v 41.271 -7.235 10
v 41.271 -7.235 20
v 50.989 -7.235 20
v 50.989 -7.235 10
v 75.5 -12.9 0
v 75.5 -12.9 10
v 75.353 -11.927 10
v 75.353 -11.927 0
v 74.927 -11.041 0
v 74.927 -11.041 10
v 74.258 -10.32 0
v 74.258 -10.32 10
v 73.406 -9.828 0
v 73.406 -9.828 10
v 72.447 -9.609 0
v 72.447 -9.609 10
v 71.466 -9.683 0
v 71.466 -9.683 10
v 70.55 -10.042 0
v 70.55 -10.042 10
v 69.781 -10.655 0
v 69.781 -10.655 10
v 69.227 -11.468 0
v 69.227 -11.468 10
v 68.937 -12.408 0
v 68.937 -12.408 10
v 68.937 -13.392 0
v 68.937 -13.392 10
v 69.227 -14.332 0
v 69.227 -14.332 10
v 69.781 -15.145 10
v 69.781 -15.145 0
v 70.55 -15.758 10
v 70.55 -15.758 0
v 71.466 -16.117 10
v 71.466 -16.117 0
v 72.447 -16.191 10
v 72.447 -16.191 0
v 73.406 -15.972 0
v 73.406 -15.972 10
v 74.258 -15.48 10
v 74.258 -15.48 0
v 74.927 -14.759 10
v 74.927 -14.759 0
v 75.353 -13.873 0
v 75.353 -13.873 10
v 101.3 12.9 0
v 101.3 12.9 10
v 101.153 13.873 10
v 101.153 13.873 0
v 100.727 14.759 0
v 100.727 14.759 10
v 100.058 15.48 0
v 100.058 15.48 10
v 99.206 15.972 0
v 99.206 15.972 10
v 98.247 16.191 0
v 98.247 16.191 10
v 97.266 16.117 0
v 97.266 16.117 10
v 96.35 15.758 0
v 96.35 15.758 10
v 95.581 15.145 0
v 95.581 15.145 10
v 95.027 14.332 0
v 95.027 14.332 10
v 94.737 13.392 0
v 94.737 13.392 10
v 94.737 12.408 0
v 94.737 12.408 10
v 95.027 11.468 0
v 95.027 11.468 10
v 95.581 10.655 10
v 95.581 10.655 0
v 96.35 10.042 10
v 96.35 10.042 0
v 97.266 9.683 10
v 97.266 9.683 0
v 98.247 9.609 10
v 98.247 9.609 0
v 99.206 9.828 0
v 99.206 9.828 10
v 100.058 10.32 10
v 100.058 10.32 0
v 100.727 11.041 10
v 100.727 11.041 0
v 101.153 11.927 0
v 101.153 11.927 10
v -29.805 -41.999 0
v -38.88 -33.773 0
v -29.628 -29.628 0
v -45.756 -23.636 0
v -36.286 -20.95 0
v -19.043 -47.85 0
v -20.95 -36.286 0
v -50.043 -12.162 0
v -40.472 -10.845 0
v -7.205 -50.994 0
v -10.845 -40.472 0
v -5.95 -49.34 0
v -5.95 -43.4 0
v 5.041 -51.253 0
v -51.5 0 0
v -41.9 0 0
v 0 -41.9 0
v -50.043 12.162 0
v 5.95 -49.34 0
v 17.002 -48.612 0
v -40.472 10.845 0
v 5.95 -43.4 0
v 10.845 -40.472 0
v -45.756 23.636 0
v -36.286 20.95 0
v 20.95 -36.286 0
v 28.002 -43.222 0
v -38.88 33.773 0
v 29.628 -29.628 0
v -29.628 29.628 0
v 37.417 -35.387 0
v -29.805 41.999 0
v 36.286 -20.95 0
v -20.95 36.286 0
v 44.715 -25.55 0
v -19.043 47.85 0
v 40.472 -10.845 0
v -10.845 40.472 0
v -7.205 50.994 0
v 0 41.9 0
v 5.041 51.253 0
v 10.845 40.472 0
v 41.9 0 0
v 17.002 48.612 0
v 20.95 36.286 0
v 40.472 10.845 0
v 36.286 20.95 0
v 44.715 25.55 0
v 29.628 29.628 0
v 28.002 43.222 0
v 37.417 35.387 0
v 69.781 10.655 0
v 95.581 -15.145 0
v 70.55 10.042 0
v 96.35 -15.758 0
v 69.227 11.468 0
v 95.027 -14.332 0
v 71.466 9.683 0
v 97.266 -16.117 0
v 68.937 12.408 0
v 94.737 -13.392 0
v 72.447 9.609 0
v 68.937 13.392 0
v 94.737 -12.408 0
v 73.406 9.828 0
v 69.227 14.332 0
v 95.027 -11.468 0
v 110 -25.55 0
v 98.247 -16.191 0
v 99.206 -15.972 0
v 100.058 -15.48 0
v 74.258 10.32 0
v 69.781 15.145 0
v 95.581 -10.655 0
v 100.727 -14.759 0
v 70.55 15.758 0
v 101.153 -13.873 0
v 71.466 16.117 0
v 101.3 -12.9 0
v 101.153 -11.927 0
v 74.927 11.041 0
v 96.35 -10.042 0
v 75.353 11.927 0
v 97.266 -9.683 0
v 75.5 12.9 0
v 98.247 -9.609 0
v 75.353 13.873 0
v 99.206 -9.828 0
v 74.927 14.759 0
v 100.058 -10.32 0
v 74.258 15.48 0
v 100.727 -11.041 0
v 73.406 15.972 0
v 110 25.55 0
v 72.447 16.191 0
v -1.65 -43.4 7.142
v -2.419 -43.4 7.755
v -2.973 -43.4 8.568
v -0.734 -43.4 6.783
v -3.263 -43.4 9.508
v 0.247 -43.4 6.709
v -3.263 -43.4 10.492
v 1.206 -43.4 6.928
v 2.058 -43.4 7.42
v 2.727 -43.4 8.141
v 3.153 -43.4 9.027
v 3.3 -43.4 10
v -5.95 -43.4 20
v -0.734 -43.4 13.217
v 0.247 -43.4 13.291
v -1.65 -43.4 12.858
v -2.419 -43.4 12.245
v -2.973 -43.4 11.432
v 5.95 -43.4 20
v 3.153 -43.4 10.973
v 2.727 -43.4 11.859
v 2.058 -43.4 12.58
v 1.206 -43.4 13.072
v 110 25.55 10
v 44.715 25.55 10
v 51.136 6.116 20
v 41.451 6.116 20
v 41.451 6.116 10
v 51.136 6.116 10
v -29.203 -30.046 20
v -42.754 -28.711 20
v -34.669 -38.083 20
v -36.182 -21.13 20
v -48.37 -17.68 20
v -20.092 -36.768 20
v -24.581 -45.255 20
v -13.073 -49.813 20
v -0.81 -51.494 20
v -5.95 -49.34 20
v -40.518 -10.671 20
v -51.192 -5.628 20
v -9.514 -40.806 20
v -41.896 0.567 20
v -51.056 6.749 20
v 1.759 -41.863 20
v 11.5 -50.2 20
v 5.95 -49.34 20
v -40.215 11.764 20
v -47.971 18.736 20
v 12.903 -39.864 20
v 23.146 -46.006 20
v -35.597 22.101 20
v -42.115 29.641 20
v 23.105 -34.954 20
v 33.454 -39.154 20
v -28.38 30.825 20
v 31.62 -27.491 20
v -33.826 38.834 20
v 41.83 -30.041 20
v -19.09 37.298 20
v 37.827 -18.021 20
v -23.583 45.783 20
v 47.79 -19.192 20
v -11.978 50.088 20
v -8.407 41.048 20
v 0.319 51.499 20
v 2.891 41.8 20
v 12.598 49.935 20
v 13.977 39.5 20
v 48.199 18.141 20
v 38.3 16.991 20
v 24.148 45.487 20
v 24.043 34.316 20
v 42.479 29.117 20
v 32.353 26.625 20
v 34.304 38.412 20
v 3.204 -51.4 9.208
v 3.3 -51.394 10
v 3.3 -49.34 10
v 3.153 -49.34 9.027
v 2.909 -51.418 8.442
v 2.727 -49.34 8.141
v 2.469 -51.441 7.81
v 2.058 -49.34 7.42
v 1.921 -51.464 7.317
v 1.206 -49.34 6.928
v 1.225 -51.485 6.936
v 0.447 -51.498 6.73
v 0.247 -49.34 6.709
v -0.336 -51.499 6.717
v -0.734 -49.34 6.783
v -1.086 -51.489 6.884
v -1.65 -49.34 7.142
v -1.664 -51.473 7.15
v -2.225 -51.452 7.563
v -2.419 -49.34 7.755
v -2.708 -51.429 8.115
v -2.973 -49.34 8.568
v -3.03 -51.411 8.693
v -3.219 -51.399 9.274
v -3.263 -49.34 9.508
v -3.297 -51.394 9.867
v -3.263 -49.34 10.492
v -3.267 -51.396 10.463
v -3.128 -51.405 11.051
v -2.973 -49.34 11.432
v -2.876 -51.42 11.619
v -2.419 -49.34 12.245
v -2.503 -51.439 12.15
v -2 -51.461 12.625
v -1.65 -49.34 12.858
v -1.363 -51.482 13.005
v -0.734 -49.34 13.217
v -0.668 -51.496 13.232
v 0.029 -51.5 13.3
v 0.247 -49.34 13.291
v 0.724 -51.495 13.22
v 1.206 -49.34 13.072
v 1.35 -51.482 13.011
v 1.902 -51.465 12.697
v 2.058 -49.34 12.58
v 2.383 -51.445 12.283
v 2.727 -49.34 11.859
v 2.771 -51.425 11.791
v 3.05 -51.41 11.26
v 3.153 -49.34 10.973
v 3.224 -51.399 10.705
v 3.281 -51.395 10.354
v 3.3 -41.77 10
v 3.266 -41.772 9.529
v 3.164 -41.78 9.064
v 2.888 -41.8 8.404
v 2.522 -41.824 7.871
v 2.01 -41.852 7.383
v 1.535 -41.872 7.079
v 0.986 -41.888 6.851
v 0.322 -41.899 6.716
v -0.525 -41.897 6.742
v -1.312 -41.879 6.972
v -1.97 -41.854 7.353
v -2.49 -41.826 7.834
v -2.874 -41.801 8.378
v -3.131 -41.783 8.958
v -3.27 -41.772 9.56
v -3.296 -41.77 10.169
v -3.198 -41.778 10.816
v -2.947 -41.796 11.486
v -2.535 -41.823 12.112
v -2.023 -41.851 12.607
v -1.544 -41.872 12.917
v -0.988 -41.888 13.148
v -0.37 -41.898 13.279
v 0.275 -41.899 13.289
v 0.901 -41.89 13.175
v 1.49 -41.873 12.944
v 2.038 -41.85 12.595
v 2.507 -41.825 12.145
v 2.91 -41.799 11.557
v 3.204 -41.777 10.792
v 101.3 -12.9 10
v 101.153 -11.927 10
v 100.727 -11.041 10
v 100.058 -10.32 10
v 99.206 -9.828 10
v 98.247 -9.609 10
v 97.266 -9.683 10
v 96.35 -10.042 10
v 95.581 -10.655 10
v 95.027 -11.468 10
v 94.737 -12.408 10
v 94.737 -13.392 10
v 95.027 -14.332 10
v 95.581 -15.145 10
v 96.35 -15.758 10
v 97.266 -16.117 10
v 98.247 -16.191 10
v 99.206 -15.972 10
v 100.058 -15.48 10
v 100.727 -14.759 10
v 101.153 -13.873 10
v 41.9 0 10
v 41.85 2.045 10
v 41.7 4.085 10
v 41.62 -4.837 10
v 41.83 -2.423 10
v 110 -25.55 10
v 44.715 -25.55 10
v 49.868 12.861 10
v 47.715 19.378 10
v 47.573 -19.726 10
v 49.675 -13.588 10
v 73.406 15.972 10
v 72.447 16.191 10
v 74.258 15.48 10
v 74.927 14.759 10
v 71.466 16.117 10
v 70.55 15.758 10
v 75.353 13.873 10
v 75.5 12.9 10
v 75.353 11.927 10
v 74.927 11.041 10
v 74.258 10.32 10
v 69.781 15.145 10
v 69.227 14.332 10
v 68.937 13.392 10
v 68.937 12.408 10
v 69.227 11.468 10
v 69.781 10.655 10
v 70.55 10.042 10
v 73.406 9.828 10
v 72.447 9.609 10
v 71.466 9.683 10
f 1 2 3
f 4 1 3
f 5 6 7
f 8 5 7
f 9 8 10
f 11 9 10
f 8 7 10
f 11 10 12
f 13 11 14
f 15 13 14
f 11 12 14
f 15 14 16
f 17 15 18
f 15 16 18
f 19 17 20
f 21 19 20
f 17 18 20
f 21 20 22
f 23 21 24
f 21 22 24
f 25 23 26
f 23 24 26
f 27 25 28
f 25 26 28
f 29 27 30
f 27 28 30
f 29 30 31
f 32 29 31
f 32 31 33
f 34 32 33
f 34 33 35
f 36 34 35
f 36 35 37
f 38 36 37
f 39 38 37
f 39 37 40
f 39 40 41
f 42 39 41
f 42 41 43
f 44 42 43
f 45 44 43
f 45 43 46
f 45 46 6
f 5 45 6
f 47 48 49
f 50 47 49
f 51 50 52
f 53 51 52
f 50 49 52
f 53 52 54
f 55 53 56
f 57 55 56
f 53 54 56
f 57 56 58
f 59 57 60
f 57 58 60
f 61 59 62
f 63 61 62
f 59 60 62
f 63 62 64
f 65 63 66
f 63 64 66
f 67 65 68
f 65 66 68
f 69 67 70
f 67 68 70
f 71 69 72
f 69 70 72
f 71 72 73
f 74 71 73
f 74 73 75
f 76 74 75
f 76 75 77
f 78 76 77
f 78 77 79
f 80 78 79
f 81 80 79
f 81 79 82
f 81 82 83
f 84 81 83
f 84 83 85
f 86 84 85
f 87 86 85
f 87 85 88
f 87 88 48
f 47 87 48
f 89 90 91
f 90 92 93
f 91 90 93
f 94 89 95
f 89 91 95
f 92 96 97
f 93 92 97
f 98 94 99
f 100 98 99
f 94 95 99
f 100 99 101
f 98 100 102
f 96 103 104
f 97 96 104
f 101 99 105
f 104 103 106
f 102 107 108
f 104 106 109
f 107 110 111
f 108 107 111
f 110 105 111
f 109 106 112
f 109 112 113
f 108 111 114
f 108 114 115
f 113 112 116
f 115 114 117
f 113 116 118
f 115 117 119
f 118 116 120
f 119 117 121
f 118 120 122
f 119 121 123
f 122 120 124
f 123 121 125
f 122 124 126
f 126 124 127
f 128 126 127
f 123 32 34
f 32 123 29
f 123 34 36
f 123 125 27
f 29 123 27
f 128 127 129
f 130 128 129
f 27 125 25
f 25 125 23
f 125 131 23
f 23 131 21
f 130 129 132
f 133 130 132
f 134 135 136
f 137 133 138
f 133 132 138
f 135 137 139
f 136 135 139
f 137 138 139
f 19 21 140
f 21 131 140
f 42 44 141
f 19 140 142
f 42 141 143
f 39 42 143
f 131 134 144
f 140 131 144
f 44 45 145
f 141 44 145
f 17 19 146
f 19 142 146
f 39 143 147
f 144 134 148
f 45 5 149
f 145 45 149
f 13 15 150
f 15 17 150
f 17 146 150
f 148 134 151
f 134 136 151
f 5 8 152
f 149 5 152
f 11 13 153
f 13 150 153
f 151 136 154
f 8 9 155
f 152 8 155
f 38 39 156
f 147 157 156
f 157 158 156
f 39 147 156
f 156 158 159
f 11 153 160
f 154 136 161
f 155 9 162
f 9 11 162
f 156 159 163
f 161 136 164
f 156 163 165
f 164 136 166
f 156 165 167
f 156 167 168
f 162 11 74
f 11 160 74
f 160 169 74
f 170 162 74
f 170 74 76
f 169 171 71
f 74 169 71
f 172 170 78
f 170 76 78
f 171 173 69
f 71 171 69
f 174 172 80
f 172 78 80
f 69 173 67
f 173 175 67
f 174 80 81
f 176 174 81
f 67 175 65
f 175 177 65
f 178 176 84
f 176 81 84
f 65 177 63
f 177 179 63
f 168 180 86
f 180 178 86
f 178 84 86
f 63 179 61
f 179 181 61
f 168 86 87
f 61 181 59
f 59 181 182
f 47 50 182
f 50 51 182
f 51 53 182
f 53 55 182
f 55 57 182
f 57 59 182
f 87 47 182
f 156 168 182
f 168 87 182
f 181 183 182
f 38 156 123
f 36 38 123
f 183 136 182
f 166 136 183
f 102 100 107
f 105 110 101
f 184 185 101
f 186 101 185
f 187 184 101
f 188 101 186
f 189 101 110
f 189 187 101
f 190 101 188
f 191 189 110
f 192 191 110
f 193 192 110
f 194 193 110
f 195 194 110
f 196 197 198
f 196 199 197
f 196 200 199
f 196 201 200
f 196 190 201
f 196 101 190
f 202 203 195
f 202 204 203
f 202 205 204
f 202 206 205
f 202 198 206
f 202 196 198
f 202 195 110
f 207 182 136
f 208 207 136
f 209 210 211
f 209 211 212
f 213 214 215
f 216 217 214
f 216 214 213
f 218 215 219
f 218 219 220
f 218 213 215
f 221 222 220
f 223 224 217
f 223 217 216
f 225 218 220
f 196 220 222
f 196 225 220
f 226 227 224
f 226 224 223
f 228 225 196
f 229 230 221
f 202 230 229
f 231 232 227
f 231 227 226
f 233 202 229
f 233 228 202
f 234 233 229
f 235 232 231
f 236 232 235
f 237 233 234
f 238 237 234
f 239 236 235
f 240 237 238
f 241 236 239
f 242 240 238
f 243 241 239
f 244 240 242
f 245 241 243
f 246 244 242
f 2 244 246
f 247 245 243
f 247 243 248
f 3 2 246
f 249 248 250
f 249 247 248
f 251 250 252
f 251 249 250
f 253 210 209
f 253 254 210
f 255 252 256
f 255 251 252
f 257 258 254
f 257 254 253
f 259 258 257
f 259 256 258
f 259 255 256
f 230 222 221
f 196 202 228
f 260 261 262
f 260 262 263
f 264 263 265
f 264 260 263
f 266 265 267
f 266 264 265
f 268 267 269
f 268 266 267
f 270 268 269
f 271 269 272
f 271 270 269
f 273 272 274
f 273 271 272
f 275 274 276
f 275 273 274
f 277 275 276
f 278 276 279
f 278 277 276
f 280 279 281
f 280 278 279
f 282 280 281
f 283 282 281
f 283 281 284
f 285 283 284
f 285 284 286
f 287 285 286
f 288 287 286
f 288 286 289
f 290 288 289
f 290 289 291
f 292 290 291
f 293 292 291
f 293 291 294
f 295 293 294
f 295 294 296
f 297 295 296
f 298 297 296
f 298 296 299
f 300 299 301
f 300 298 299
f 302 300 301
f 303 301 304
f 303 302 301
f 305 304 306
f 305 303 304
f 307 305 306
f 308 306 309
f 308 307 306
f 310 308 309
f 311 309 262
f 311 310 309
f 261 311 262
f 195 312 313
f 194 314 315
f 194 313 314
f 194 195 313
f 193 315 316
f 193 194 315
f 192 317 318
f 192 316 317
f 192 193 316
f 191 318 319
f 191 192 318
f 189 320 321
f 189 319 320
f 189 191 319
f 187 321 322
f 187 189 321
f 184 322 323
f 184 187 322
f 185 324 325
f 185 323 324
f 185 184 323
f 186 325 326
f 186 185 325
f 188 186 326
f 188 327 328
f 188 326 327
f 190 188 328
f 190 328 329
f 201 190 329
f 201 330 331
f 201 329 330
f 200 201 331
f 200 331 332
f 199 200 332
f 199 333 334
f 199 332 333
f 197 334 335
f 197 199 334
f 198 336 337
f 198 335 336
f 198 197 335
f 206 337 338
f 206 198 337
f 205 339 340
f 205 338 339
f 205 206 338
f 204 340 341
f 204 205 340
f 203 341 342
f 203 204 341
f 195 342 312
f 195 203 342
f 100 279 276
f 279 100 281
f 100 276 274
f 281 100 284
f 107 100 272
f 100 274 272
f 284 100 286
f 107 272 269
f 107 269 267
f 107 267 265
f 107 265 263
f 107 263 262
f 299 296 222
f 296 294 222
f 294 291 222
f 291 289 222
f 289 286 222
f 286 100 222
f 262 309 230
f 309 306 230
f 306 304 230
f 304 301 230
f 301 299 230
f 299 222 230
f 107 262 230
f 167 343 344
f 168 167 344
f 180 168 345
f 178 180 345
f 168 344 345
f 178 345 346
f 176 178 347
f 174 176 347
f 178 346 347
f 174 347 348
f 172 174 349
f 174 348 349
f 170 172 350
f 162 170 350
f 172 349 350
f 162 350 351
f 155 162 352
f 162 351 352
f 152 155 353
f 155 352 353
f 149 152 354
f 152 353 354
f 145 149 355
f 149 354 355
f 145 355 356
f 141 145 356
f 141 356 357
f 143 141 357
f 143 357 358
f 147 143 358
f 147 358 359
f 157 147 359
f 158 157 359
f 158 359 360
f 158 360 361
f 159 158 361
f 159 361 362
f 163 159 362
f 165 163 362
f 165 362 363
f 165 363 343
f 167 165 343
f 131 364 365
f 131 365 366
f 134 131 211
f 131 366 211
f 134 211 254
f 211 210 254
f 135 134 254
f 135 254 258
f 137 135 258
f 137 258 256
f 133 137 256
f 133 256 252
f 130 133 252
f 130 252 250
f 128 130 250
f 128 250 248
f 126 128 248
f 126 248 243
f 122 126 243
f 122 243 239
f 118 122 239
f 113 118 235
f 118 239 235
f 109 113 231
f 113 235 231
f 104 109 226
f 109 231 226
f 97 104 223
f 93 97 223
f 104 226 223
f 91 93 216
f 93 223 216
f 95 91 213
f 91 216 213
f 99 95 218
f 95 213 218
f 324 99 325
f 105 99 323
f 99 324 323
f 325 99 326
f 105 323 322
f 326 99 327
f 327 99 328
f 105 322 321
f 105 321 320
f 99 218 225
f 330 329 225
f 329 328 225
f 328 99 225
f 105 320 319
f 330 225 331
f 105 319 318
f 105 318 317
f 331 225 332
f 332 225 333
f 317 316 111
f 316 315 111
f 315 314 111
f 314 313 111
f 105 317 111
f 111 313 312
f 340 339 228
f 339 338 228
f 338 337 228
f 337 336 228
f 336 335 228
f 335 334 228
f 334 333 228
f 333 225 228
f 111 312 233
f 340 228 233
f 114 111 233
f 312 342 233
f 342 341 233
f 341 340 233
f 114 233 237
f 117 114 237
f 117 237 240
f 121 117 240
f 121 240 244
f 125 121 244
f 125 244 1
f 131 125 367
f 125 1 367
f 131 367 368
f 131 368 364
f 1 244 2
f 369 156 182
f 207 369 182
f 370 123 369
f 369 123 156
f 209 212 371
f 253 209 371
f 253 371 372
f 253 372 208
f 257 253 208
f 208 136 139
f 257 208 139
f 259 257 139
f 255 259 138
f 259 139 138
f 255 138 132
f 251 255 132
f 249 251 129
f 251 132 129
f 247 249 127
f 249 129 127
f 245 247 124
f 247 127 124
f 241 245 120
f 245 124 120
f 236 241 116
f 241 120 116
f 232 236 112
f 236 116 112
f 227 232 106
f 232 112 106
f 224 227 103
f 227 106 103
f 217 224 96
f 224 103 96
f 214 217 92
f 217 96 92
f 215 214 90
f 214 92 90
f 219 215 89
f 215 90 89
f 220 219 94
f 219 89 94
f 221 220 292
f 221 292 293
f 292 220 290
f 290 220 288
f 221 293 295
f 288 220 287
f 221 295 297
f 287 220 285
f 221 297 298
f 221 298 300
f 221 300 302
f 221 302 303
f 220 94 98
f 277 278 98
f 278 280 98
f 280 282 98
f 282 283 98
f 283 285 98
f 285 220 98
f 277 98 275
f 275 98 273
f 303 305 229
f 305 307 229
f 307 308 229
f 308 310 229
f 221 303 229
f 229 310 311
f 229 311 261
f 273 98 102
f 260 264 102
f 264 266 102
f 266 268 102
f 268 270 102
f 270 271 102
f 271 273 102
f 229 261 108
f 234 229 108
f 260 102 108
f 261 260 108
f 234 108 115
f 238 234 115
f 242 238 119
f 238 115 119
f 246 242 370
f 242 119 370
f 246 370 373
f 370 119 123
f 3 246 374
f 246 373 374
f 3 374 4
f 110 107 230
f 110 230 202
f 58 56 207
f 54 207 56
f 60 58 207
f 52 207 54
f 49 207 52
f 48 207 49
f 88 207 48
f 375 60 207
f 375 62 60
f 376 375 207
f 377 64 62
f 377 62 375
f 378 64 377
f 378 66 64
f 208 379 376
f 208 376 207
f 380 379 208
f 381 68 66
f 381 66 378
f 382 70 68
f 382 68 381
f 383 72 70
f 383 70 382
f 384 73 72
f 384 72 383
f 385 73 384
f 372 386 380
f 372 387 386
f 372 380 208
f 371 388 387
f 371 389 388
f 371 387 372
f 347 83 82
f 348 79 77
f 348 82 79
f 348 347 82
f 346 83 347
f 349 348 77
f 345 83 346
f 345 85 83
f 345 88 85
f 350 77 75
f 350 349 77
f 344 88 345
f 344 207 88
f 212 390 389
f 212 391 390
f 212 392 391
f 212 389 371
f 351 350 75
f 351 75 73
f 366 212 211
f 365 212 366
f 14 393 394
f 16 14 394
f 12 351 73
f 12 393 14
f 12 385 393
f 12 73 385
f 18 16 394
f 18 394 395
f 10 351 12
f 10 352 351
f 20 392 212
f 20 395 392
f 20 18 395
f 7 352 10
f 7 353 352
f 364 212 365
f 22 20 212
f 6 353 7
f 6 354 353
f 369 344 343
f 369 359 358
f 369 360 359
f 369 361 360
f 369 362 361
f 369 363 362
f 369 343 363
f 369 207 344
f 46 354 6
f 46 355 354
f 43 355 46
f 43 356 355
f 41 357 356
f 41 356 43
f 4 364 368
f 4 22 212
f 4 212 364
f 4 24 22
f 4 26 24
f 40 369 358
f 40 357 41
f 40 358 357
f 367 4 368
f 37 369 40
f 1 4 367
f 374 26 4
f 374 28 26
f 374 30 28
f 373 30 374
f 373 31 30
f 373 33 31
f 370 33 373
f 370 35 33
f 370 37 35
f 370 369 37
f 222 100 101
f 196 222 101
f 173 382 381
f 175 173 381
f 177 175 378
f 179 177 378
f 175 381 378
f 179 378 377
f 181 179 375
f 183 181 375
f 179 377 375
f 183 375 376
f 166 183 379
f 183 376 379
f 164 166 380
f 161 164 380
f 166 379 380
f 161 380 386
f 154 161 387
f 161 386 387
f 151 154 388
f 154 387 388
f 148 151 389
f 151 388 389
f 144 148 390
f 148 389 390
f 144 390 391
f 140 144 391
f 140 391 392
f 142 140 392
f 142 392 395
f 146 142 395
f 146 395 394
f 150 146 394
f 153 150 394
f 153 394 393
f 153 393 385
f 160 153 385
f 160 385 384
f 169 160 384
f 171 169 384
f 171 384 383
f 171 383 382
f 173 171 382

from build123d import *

# Parameters (mm, degrees)
SKETCH1_R              = 51.5
BOSS_EXTRUDE1_DEPTH    = 20
BOSS_EXTRUDE2_DEPTH    = 10
SKETCH2_R              = 41.9
CUT_EXTRUDE1_DEPTH     = 124.094475912
SKETCH3_W              = 35
SKETCH3_H              = 13.351317372
CUT_EXTRUDE2_DEPTH     = 10
SKETCH4_W              = 11.9
SKETCH4_H              = 5.94
CUT_EXTRUDE3_DEPTH     = 124.094475912
CUT_EXTRUDE4_START     = -51.500000101
CUT_EXTRUDE4_OUTLINE_R = 3.3
CUT_EXTRUDE4_DEPTH     = 9.730154575
SKETCH5_R              = 3.3
CUT_EXTRUDE5_DEPTH     = 122.869807632


# Read off the part's stored shape, not the designer's step: Cut-Extrude4
with BuildPart() as part:
    # Sketch1 → Boss-Extrude1 (new body)
    with BuildSketch(Plane.XY):
        Circle(SKETCH1_R)
    extrude(amount=BOSS_EXTRUDE1_DEPTH)

    # 3DSketch1 → Boss-Extrude2 (add)
    with BuildSketch(Plane(origin=(0, -25.55, 0), x_dir=(0.9069189732091603, 0.4213050866453462, 0), z_dir=(0, 0, -1))):
        Polygon((0, 0), (99.761087053, 46.343559531), (121.289776981, 0), (21.528689928, -46.343559531), align=None)
    extrude(amount=-BOSS_EXTRUDE2_DEPTH)

    # Sketch2 → Cut-Extrude1 (cut, through all)
    with BuildSketch(Plane.XY.offset(20)):
        Circle(SKETCH2_R)
    extrude(amount=-CUT_EXTRUDE1_DEPTH, mode=Mode.SUBTRACT)

    # Sketch3 → Cut-Extrude2 (cut)
    with BuildSketch(Plane.XY.offset(20)):
        with Locations((56.5, -0.55960538)):
            Rectangle(SKETCH3_W, SKETCH3_H)
    extrude(amount=-CUT_EXTRUDE2_DEPTH, mode=Mode.SUBTRACT)

    # Sketch4 → Cut-Extrude3 (cut, through all)
    with BuildSketch(Plane.XY.offset(20)):
        with Locations((0, -46.37)):
            Rectangle(SKETCH4_W, SKETCH4_H)
    extrude(amount=-CUT_EXTRUDE3_DEPTH, mode=Mode.SUBTRACT)

    # Cut-Extrude4 outline → Cut-Extrude4 (cut)
    with BuildSketch(Plane(origin=(0, 0, 0), x_dir=(1, 0, 0), z_dir=(0, 1, 0)).offset(CUT_EXTRUDE4_START)):
        with Locations((0, -10)):
            Circle(CUT_EXTRUDE4_OUTLINE_R)
    extrude(amount=CUT_EXTRUDE4_DEPTH, mode=Mode.SUBTRACT)

    # Sketch5 → Cut-Extrude5 (cut, through all)
    with BuildSketch(Plane.XY.offset(10)):
        with Locations((72.2, 12.9)):
            Circle(SKETCH5_R)
        with Locations((98, 12.9)):
            Circle(SKETCH5_R)
        with Locations((98, -12.9)):
            Circle(SKETCH5_R)
        with Locations((72.2, -12.9)):
            Circle(SKETCH5_R)
    extrude(amount=-CUT_EXTRUDE5_DEPTH, mode=Mode.SUBTRACT)


solid = part.part
